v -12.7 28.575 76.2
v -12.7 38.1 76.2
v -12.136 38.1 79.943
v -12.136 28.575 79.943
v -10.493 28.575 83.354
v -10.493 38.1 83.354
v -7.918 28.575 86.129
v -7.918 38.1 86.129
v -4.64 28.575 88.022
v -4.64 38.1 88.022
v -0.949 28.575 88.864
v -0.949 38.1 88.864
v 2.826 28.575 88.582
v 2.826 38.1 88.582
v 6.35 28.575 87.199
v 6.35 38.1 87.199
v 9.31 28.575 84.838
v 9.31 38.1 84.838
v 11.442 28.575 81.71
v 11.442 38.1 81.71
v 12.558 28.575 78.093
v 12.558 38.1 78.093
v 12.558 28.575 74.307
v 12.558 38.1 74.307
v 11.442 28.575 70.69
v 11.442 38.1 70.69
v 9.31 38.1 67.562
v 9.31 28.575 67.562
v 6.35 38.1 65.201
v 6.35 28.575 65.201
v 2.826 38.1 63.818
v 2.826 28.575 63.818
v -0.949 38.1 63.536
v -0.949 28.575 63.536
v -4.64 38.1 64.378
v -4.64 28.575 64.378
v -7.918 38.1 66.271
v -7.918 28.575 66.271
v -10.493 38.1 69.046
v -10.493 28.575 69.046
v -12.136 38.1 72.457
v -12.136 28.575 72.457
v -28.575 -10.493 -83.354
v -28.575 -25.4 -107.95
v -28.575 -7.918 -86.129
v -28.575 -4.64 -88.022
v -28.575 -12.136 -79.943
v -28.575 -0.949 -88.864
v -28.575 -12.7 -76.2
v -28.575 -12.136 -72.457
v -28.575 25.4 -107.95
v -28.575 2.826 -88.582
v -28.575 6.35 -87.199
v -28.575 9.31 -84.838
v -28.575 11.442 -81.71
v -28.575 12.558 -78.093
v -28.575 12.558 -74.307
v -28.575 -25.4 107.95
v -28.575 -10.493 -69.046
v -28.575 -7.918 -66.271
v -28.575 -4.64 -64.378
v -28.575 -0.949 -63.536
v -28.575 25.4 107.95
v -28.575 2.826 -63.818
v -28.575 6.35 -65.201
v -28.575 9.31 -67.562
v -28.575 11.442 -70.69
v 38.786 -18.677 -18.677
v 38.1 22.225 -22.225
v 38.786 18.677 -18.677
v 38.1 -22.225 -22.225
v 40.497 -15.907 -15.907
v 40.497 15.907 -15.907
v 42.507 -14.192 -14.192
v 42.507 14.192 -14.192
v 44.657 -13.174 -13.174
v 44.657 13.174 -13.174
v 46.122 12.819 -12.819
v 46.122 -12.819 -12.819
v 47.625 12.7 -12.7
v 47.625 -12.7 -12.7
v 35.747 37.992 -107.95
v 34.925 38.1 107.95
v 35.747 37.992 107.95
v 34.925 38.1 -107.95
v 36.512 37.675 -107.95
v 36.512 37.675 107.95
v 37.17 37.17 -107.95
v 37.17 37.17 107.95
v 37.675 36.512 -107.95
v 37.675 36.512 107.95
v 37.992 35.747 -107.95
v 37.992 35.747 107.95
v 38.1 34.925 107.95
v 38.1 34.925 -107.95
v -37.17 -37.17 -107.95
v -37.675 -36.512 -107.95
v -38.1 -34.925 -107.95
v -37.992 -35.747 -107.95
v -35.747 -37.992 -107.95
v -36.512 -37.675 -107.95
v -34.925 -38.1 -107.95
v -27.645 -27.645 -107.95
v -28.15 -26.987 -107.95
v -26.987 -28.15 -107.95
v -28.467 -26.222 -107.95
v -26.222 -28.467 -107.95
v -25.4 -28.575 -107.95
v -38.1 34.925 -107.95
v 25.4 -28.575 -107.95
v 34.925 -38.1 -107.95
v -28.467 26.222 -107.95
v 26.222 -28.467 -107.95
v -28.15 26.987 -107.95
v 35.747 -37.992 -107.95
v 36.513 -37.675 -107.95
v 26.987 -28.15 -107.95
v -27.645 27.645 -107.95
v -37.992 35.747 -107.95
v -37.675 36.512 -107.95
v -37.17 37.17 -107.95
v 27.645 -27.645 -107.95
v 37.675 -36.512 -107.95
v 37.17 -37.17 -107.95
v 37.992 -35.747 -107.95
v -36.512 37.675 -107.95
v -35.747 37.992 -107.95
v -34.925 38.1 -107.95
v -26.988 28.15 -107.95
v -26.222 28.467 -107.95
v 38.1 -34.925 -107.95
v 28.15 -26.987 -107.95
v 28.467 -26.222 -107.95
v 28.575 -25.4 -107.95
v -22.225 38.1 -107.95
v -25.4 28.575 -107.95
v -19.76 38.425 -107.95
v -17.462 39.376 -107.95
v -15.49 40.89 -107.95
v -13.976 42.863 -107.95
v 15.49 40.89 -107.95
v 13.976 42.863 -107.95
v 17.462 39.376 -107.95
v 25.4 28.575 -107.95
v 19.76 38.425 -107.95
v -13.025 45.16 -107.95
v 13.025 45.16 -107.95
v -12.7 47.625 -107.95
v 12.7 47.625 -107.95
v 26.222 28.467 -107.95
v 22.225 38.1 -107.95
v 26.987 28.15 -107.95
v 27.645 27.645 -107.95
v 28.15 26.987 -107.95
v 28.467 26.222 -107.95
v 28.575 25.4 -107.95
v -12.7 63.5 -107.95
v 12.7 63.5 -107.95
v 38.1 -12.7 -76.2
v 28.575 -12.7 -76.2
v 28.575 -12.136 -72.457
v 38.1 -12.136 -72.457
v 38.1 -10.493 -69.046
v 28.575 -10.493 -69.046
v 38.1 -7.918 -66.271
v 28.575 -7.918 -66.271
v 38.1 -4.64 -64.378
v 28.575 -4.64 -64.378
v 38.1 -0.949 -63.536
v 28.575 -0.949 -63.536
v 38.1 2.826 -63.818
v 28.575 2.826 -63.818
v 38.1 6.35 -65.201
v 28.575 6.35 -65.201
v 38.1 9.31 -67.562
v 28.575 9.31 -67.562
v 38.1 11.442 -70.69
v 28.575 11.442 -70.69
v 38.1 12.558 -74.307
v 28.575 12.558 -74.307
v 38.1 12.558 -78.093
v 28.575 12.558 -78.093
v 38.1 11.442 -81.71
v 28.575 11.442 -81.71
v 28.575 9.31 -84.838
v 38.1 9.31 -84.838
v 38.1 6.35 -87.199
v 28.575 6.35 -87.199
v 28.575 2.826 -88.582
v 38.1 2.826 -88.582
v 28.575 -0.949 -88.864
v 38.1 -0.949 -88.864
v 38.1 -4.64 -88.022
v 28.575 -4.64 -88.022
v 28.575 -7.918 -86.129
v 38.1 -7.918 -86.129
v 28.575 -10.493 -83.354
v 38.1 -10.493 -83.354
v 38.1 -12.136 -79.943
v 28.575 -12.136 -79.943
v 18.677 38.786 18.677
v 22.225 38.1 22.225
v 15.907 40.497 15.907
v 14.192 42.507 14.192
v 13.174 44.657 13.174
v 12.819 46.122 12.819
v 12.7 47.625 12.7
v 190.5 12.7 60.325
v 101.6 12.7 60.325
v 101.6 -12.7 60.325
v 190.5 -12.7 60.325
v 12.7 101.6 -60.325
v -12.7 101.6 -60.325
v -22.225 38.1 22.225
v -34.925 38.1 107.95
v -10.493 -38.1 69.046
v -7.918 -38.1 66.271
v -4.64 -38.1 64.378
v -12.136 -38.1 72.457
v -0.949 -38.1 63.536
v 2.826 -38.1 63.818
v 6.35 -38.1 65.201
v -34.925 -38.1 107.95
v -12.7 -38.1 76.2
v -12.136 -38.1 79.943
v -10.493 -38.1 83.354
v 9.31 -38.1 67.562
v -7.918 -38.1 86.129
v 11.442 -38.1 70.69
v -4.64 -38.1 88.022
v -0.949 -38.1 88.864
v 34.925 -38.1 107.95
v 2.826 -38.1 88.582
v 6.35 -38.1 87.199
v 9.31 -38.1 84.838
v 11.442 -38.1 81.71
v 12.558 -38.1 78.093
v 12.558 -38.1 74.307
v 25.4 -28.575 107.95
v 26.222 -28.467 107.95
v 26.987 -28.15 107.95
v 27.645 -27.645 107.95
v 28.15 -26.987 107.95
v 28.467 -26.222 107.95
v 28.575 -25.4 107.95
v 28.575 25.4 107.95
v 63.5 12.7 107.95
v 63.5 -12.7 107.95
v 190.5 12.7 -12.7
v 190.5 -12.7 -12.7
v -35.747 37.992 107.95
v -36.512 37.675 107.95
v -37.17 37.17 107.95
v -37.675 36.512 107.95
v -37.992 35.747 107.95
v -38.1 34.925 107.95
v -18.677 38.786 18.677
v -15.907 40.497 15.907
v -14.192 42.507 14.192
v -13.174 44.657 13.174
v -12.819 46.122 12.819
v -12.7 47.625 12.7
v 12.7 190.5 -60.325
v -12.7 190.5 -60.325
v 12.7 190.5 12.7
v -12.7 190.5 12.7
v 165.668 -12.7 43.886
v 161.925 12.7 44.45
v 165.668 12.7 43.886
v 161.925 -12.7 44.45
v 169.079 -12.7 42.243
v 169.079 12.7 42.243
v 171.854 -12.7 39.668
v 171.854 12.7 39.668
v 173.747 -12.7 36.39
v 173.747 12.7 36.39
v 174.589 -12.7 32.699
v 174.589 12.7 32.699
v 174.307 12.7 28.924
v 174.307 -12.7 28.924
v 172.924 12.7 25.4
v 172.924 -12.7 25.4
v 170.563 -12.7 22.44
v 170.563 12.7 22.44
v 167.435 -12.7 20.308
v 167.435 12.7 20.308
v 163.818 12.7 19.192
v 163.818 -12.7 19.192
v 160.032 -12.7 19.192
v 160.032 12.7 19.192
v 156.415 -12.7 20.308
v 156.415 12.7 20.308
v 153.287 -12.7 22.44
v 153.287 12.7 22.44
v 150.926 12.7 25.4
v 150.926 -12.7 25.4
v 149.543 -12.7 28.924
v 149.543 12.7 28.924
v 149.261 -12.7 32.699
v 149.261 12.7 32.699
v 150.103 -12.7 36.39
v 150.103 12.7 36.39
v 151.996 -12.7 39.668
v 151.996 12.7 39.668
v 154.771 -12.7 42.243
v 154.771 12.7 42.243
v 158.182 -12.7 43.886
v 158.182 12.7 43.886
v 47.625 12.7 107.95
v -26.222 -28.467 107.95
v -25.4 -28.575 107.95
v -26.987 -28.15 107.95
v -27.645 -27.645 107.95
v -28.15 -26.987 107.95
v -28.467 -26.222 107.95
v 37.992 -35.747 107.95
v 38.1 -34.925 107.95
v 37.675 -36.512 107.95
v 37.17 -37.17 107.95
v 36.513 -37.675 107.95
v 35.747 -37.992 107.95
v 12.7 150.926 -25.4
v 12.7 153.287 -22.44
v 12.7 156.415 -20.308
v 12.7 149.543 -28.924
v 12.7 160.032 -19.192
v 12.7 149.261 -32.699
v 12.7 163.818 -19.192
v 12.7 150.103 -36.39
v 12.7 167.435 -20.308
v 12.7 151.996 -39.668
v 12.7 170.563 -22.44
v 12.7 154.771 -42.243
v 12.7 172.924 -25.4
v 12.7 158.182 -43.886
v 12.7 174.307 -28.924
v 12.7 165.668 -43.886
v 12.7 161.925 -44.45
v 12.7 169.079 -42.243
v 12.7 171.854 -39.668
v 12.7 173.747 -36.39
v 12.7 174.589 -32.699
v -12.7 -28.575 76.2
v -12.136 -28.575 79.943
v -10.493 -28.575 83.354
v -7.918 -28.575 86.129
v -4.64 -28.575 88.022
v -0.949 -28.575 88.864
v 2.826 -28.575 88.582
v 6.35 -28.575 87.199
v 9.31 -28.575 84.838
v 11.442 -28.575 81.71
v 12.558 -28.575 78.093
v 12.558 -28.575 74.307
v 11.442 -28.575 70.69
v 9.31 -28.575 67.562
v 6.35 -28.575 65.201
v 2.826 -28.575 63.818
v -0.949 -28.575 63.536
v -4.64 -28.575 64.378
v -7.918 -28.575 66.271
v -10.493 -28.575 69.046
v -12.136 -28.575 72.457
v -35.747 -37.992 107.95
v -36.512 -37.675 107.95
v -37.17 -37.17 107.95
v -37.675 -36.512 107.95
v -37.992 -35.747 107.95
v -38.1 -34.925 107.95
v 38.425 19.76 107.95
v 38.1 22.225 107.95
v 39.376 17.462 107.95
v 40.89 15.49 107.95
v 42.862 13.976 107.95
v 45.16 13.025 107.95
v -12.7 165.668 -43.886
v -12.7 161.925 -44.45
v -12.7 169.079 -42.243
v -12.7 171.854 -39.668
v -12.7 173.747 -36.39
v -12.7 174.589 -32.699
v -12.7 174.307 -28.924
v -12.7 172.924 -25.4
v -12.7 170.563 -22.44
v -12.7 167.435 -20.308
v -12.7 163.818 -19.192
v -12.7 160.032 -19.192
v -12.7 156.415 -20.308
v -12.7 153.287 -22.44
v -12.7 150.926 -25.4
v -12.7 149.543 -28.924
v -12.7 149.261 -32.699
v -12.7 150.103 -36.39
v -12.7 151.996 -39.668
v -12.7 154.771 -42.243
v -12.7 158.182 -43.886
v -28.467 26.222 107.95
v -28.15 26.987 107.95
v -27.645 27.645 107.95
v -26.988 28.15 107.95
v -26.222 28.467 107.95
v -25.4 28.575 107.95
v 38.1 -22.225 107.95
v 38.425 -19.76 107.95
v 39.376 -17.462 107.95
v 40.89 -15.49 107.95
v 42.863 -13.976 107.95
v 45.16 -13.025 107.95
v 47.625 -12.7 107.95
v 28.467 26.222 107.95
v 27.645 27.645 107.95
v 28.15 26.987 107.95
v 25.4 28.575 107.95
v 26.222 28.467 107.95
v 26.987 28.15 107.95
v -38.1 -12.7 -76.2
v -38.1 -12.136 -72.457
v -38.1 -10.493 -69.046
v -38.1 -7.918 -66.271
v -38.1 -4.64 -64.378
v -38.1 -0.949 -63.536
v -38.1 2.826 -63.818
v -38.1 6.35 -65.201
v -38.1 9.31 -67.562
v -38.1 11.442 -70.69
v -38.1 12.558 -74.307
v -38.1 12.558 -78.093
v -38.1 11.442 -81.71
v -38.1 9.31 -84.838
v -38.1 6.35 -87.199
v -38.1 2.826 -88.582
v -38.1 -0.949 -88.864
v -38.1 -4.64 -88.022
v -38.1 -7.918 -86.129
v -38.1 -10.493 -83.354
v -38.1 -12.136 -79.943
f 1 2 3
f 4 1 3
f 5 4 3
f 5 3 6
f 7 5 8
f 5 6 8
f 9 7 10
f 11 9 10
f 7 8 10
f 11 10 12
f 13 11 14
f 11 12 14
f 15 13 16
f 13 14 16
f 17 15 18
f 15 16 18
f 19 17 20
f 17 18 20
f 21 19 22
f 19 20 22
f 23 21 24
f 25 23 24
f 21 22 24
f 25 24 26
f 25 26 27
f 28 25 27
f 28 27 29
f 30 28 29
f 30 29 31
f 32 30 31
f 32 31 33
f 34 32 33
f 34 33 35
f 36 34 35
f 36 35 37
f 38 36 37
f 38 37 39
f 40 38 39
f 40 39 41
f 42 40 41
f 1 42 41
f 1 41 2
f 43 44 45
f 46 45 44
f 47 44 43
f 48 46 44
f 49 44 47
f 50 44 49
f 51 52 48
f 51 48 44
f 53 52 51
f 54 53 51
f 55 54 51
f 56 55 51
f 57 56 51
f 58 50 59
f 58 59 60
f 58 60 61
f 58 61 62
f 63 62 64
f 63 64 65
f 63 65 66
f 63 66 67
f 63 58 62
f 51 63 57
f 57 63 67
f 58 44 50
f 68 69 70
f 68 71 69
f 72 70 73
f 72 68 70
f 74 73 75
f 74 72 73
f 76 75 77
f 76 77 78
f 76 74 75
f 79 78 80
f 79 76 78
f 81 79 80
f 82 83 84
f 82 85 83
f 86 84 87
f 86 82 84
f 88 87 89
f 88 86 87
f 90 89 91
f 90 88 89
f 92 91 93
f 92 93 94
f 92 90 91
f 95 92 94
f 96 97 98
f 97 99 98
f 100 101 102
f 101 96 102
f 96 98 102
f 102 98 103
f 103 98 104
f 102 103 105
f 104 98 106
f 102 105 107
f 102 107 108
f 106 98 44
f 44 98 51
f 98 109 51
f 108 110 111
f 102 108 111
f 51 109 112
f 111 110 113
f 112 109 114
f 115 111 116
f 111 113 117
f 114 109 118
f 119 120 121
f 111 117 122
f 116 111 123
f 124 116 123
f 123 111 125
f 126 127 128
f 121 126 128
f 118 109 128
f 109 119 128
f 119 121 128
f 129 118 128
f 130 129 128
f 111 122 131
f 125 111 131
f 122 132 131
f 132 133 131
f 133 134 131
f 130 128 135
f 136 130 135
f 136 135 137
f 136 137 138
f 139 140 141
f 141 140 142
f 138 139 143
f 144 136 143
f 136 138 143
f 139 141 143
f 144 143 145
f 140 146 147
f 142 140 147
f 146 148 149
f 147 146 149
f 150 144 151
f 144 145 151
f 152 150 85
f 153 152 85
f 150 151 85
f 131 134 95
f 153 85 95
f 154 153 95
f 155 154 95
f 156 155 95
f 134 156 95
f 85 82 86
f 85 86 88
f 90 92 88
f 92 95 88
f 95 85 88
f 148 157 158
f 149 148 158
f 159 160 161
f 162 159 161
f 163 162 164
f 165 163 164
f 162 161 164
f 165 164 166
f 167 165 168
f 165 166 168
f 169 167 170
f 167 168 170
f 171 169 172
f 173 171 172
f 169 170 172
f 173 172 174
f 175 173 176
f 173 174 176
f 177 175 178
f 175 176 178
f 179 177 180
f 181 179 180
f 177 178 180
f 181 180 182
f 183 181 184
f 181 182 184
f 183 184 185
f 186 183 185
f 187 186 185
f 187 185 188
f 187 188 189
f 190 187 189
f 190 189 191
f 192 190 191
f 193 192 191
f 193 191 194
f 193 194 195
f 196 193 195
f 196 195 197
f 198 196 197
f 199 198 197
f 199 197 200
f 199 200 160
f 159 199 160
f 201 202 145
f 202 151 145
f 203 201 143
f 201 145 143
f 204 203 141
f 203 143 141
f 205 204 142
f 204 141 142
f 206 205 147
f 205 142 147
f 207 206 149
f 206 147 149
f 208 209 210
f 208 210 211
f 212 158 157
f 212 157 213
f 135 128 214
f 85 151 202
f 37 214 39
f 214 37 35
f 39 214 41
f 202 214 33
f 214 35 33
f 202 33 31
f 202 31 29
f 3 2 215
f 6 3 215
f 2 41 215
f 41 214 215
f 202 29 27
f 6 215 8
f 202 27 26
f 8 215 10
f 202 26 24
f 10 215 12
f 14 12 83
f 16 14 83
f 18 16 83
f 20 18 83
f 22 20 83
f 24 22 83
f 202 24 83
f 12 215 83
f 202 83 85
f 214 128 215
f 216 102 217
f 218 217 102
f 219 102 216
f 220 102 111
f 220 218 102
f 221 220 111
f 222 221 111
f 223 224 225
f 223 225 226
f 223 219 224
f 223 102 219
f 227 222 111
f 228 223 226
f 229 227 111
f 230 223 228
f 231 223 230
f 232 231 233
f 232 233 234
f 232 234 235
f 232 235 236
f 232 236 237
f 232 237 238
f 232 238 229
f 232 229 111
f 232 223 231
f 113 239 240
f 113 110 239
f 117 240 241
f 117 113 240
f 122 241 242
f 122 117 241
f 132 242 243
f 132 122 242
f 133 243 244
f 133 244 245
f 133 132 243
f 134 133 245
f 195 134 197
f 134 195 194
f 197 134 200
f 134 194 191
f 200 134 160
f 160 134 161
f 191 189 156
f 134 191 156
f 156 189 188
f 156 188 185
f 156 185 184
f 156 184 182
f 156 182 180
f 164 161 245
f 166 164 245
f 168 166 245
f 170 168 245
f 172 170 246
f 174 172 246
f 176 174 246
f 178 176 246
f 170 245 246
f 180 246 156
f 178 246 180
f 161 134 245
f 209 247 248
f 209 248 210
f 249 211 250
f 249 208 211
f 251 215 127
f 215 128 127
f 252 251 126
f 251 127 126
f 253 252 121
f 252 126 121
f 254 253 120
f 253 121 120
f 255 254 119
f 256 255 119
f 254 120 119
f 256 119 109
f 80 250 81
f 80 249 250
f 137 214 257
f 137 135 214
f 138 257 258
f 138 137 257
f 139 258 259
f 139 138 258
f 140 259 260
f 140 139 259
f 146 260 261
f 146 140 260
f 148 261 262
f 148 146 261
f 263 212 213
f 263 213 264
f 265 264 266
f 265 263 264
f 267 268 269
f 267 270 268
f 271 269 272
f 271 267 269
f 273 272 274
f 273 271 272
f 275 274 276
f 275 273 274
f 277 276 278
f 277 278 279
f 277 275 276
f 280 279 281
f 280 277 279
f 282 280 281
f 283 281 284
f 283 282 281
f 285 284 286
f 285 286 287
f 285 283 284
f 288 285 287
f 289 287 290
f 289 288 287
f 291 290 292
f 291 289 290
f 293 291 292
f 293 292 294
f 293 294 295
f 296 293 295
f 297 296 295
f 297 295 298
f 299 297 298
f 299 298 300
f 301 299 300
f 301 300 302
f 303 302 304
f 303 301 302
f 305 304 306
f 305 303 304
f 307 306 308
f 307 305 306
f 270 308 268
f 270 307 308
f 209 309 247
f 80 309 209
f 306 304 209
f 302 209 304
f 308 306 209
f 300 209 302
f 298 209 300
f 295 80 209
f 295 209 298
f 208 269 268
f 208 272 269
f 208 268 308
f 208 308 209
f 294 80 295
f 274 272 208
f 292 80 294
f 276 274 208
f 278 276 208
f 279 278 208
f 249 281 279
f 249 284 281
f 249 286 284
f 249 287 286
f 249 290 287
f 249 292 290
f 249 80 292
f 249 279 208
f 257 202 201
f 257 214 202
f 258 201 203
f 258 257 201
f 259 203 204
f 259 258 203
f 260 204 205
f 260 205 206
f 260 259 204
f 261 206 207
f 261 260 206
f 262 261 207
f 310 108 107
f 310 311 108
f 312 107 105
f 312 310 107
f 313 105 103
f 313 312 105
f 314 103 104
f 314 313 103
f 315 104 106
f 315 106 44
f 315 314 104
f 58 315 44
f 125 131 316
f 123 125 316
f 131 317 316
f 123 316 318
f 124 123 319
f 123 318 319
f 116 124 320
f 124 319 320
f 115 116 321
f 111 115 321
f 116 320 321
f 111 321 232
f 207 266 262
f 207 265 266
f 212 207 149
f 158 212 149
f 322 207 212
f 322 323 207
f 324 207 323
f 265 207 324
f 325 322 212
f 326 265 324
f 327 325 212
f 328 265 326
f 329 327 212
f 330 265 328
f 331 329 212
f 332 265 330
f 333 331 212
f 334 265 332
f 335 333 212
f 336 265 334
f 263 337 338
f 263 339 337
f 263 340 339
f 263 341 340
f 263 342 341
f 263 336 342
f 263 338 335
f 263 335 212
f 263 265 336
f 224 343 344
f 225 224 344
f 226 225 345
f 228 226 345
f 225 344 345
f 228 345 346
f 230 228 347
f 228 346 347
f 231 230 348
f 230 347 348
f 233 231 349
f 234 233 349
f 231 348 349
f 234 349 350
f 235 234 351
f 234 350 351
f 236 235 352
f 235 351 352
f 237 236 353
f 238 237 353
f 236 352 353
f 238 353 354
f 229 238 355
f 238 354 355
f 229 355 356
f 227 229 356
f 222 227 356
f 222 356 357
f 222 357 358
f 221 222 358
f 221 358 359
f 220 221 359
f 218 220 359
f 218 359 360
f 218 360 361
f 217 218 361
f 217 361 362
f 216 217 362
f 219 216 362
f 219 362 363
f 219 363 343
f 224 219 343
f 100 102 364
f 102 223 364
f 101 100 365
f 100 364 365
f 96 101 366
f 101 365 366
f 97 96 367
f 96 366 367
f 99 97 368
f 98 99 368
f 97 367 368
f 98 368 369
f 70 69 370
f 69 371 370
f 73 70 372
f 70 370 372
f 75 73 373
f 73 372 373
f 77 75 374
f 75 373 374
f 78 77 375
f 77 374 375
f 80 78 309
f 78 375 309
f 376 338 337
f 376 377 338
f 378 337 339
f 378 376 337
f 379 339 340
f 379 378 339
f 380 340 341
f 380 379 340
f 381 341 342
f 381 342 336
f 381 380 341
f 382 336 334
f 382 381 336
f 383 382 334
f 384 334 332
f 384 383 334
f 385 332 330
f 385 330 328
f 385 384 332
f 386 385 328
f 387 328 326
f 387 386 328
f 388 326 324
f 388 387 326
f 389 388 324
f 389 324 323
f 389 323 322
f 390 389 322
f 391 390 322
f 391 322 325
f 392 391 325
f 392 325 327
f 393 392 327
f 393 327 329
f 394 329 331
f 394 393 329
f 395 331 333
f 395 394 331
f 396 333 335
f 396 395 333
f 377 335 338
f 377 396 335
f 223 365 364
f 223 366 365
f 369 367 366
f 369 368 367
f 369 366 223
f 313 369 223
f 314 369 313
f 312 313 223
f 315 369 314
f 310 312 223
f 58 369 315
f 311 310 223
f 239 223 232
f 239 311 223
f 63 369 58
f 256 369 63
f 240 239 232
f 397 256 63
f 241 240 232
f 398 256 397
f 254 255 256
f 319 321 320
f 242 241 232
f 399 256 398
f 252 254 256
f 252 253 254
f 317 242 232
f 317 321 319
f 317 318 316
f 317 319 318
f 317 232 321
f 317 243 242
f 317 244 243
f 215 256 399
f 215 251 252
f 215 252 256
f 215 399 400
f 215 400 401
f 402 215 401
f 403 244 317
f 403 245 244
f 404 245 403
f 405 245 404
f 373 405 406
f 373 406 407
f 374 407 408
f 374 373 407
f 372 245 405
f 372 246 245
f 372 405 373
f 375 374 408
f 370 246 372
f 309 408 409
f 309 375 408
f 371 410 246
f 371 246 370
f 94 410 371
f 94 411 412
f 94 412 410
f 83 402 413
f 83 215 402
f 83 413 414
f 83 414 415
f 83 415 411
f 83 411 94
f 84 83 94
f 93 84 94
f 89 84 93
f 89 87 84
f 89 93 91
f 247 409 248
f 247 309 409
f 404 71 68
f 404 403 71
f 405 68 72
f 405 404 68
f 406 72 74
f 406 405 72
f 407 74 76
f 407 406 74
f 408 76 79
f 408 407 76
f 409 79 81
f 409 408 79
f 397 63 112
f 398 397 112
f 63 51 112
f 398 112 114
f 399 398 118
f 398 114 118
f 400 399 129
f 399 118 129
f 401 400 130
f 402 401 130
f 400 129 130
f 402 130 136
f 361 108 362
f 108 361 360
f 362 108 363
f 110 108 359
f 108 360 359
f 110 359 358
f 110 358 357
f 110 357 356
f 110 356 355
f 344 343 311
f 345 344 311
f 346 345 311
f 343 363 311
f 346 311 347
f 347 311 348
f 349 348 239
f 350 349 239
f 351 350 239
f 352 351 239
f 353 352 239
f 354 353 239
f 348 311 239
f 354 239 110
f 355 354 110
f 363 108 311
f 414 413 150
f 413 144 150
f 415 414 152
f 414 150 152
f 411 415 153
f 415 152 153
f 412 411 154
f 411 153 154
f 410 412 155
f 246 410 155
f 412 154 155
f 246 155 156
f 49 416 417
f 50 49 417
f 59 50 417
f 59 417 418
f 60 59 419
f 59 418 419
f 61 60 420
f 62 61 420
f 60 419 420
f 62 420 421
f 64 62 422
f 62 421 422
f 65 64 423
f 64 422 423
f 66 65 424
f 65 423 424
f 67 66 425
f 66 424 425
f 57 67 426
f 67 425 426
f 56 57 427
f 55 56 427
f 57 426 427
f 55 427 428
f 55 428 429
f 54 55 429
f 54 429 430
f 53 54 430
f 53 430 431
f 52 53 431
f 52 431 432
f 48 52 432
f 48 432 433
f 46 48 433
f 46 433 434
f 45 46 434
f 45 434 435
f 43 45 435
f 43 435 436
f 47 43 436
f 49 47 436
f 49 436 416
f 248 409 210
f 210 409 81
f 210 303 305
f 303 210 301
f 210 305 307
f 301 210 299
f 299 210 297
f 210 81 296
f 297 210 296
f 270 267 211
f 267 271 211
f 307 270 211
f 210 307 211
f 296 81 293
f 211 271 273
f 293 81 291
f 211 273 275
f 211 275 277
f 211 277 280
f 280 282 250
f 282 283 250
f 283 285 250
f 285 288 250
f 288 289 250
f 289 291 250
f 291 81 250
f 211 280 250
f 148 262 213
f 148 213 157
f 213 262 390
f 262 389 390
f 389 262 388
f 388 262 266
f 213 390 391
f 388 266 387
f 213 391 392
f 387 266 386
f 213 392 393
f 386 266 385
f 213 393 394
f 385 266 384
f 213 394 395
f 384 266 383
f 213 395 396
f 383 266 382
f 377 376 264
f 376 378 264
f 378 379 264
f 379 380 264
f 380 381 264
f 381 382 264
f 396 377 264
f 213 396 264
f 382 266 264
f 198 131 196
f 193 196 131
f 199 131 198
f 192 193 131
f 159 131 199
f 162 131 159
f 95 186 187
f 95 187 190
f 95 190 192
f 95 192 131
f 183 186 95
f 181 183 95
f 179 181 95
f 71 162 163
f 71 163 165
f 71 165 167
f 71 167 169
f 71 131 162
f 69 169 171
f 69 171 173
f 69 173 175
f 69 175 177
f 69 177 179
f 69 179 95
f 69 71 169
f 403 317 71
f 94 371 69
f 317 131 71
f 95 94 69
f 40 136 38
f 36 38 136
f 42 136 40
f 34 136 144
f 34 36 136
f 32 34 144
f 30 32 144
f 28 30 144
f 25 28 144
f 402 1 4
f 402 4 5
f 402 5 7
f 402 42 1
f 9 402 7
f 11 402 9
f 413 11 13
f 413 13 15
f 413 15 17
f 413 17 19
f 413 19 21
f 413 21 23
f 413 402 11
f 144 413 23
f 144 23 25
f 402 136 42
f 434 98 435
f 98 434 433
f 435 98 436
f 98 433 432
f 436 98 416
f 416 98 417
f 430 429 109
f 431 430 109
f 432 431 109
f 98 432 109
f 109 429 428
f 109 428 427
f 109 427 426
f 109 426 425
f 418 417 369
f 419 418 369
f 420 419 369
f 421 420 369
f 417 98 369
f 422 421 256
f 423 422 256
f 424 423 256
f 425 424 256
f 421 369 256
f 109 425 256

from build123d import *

# Parameters (mm, degrees)
SKETCH1_W          = 76.2
SKETCH1_H          = 76.2
SKETCH1_W_2        = 57.15
SKETCH1_H_2        = 57.15
EXTRUDE1_DEPTH     = 107.95
SKETCH2_R          = 12.7
CUT_EXTRUDE1_DEPTH = 138.518189706
SKETCH3_R          = 12.7
CUT_EXTRUDE2_DEPTH = 138.518189706
SKETCH4_R          = 12.7
EXTRUDE2_DEPTH     = 12.7
SKETCH5_R          = 12.7
EXTRUDE3_DEPTH     = 12.7
FILLET1_R          = 9.525
FILLET2_R          = 3.175


with BuildPart() as part:
    # Sketch1 → Extrude1 (new, symmetric)
    with BuildSketch(Plane.XY):
        Rectangle(SKETCH1_W, SKETCH1_H)
        Rectangle(SKETCH1_W_2, SKETCH1_H_2, mode=Mode.SUBTRACT)
    extrude(amount=EXTRUDE1_DEPTH, both=True)

    # Sketch2 → Cut-Extrude1 (cut, through all)
    with BuildSketch(Plane(origin=(0, 38.1, 0), x_dir=(-1, 0, 0), z_dir=(0, 1, 0))):
        with Locations((0, 76.2)):
            Circle(SKETCH2_R)
    extrude(amount=-CUT_EXTRUDE1_DEPTH, mode=Mode.SUBTRACT)

    # Sketch3 → Cut-Extrude2 (cut, through all)
    with BuildSketch(Plane.ZY.offset(38.1)):
        with Locations(Location((-76.2, 0, 0), (0, 0, 270))):
            Circle(SKETCH3_R)
    extrude(amount=-CUT_EXTRUDE2_DEPTH, mode=Mode.SUBTRACT)

    # Sketch4 → Extrude2 (add, symmetric)
    with BuildSketch(Plane(origin=(0, 0, 0), x_dir=(0, 0, -1), z_dir=(1, 0, 0))):
        Polygon((-12.7, 38.1), (107.95, 38.1), (107.95, 63.5), (60.325, 101.6), (60.325, 190.5), (-12.7, 190.5), align=None)
        with Locations((31.75, 161.925)):
            Circle(SKETCH4_R, mode=Mode.SUBTRACT)
    extrude(amount=EXTRUDE2_DEPTH, both=True)

    # Sketch5 → Extrude3 (add, symmetric)
    with BuildSketch(Plane(origin=(0, 0, 0), x_dir=(1, 0, 0), z_dir=(0, 1, 0))):
        Polygon((38.1, 12.7), (38.1, -107.95), (63.5, -107.95), (101.6, -60.325), (190.5, -60.325), (190.5, 12.7), align=None)
        with Locations(Location((161.925, -31.75, 0), (0, 0, 270))):
            Circle(SKETCH5_R, mode=Mode.SUBTRACT)
    extrude(amount=EXTRUDE3_DEPTH, both=True)

    # Fillet1
    fillet1_edges = [part.edges().sort_by_distance(p)[0] for p in [
        (12.7, 38.1, -47.625),
        (-12.7, 38.1, -47.625),
        (0, 38.1, 12.7),
        (38.1, 12.7, 47.625),
        (38.1, -12.7, 47.625),
        (38.1, 0, -12.7),
    ]]
    fillet(fillet1_edges, radius=FILLET1_R)

    # Fillet2
    fillet2_edges = [part.edges().sort_by_distance(p)[0] for p in [
        (-28.575, 28.575, 0),
        (-28.575, -28.575, 0),
        (28.575, -28.575, 0),
        (28.575, 28.575, 0),
        (-38.1, 38.1, 0),
        (38.1, 38.1, 0),
        (38.1, -38.1, 0),
        (-38.1, -38.1, 0),
    ]]
    fillet(fillet2_edges, radius=FILLET2_R)


solid = part.part
